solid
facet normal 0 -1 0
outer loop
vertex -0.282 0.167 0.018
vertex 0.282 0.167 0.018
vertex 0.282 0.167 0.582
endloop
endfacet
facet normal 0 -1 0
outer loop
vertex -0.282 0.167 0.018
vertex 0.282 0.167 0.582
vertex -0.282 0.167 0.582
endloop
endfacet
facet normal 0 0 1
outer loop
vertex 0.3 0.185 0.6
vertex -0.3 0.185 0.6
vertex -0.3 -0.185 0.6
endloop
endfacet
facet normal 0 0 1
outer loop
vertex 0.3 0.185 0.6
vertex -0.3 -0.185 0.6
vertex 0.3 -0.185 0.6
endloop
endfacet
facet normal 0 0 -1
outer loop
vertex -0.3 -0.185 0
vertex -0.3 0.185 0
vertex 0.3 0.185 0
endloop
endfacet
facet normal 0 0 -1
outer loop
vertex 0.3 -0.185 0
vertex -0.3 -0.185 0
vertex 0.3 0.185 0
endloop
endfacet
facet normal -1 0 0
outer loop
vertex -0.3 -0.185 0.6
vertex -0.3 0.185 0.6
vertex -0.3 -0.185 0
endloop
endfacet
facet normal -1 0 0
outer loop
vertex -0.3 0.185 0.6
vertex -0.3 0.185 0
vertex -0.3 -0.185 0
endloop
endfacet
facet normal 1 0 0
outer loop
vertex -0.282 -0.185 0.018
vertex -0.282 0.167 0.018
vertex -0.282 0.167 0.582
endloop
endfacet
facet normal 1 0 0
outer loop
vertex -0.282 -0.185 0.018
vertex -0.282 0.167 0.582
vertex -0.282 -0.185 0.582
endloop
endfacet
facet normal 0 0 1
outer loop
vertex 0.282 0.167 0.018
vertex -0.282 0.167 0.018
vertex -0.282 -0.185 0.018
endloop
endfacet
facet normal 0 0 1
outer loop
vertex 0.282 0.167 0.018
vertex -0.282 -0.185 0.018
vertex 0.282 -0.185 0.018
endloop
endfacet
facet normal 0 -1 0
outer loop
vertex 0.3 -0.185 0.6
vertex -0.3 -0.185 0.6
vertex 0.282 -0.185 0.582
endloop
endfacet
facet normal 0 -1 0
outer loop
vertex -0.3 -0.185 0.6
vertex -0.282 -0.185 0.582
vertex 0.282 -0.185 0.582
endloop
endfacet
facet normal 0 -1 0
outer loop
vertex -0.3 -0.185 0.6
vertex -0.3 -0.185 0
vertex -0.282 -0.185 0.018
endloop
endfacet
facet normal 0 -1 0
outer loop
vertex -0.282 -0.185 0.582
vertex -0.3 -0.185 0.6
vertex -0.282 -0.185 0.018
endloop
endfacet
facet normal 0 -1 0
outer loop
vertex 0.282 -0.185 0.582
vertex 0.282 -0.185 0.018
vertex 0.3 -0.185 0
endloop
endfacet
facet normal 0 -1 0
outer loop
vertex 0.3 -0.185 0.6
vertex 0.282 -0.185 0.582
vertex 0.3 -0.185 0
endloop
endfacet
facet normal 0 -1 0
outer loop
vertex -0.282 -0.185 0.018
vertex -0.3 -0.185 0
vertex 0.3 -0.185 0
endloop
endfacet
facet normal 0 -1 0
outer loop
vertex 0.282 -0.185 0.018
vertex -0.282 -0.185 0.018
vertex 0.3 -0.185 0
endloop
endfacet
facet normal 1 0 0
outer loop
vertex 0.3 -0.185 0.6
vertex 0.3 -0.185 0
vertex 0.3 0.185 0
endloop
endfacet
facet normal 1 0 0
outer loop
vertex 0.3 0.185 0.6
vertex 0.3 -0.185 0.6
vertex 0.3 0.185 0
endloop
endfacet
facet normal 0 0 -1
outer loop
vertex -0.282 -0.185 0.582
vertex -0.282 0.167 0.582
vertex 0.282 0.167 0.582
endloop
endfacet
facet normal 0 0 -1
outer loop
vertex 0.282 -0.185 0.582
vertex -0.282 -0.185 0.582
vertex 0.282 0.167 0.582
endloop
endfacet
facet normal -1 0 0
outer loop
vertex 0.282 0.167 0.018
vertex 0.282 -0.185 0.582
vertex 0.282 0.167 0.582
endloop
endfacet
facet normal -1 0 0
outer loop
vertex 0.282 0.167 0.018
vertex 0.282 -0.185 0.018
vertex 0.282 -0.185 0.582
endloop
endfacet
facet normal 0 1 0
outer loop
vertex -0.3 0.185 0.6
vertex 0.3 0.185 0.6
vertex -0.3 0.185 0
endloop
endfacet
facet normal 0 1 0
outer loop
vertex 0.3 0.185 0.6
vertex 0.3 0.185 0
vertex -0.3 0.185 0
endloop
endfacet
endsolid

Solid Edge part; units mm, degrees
sketch "Sketch1" plane through (0, 0, 0) normal (0, 0, 1) x (1, 0, 0)
  line L0 (-0.3, -0.185) -> (0.3, -0.185)
  line L1 (0.3, -0.185) -> (0.3, 0.185)
  line L2 (0.3, 0.185) -> (-0.3, 0.185)
  line L3 (-0.3, 0.185) -> (-0.3, -0.185)
  dimension "D1" = 0.6
  dimension "D2" = 0.37
extrude "Protrusion1" add sketch "Sketch1" along normal blind 0.6
shell "Dünnwand_1" thickness 0.018 removed faces 1 at (-0.206, -0.185, 0.494)
